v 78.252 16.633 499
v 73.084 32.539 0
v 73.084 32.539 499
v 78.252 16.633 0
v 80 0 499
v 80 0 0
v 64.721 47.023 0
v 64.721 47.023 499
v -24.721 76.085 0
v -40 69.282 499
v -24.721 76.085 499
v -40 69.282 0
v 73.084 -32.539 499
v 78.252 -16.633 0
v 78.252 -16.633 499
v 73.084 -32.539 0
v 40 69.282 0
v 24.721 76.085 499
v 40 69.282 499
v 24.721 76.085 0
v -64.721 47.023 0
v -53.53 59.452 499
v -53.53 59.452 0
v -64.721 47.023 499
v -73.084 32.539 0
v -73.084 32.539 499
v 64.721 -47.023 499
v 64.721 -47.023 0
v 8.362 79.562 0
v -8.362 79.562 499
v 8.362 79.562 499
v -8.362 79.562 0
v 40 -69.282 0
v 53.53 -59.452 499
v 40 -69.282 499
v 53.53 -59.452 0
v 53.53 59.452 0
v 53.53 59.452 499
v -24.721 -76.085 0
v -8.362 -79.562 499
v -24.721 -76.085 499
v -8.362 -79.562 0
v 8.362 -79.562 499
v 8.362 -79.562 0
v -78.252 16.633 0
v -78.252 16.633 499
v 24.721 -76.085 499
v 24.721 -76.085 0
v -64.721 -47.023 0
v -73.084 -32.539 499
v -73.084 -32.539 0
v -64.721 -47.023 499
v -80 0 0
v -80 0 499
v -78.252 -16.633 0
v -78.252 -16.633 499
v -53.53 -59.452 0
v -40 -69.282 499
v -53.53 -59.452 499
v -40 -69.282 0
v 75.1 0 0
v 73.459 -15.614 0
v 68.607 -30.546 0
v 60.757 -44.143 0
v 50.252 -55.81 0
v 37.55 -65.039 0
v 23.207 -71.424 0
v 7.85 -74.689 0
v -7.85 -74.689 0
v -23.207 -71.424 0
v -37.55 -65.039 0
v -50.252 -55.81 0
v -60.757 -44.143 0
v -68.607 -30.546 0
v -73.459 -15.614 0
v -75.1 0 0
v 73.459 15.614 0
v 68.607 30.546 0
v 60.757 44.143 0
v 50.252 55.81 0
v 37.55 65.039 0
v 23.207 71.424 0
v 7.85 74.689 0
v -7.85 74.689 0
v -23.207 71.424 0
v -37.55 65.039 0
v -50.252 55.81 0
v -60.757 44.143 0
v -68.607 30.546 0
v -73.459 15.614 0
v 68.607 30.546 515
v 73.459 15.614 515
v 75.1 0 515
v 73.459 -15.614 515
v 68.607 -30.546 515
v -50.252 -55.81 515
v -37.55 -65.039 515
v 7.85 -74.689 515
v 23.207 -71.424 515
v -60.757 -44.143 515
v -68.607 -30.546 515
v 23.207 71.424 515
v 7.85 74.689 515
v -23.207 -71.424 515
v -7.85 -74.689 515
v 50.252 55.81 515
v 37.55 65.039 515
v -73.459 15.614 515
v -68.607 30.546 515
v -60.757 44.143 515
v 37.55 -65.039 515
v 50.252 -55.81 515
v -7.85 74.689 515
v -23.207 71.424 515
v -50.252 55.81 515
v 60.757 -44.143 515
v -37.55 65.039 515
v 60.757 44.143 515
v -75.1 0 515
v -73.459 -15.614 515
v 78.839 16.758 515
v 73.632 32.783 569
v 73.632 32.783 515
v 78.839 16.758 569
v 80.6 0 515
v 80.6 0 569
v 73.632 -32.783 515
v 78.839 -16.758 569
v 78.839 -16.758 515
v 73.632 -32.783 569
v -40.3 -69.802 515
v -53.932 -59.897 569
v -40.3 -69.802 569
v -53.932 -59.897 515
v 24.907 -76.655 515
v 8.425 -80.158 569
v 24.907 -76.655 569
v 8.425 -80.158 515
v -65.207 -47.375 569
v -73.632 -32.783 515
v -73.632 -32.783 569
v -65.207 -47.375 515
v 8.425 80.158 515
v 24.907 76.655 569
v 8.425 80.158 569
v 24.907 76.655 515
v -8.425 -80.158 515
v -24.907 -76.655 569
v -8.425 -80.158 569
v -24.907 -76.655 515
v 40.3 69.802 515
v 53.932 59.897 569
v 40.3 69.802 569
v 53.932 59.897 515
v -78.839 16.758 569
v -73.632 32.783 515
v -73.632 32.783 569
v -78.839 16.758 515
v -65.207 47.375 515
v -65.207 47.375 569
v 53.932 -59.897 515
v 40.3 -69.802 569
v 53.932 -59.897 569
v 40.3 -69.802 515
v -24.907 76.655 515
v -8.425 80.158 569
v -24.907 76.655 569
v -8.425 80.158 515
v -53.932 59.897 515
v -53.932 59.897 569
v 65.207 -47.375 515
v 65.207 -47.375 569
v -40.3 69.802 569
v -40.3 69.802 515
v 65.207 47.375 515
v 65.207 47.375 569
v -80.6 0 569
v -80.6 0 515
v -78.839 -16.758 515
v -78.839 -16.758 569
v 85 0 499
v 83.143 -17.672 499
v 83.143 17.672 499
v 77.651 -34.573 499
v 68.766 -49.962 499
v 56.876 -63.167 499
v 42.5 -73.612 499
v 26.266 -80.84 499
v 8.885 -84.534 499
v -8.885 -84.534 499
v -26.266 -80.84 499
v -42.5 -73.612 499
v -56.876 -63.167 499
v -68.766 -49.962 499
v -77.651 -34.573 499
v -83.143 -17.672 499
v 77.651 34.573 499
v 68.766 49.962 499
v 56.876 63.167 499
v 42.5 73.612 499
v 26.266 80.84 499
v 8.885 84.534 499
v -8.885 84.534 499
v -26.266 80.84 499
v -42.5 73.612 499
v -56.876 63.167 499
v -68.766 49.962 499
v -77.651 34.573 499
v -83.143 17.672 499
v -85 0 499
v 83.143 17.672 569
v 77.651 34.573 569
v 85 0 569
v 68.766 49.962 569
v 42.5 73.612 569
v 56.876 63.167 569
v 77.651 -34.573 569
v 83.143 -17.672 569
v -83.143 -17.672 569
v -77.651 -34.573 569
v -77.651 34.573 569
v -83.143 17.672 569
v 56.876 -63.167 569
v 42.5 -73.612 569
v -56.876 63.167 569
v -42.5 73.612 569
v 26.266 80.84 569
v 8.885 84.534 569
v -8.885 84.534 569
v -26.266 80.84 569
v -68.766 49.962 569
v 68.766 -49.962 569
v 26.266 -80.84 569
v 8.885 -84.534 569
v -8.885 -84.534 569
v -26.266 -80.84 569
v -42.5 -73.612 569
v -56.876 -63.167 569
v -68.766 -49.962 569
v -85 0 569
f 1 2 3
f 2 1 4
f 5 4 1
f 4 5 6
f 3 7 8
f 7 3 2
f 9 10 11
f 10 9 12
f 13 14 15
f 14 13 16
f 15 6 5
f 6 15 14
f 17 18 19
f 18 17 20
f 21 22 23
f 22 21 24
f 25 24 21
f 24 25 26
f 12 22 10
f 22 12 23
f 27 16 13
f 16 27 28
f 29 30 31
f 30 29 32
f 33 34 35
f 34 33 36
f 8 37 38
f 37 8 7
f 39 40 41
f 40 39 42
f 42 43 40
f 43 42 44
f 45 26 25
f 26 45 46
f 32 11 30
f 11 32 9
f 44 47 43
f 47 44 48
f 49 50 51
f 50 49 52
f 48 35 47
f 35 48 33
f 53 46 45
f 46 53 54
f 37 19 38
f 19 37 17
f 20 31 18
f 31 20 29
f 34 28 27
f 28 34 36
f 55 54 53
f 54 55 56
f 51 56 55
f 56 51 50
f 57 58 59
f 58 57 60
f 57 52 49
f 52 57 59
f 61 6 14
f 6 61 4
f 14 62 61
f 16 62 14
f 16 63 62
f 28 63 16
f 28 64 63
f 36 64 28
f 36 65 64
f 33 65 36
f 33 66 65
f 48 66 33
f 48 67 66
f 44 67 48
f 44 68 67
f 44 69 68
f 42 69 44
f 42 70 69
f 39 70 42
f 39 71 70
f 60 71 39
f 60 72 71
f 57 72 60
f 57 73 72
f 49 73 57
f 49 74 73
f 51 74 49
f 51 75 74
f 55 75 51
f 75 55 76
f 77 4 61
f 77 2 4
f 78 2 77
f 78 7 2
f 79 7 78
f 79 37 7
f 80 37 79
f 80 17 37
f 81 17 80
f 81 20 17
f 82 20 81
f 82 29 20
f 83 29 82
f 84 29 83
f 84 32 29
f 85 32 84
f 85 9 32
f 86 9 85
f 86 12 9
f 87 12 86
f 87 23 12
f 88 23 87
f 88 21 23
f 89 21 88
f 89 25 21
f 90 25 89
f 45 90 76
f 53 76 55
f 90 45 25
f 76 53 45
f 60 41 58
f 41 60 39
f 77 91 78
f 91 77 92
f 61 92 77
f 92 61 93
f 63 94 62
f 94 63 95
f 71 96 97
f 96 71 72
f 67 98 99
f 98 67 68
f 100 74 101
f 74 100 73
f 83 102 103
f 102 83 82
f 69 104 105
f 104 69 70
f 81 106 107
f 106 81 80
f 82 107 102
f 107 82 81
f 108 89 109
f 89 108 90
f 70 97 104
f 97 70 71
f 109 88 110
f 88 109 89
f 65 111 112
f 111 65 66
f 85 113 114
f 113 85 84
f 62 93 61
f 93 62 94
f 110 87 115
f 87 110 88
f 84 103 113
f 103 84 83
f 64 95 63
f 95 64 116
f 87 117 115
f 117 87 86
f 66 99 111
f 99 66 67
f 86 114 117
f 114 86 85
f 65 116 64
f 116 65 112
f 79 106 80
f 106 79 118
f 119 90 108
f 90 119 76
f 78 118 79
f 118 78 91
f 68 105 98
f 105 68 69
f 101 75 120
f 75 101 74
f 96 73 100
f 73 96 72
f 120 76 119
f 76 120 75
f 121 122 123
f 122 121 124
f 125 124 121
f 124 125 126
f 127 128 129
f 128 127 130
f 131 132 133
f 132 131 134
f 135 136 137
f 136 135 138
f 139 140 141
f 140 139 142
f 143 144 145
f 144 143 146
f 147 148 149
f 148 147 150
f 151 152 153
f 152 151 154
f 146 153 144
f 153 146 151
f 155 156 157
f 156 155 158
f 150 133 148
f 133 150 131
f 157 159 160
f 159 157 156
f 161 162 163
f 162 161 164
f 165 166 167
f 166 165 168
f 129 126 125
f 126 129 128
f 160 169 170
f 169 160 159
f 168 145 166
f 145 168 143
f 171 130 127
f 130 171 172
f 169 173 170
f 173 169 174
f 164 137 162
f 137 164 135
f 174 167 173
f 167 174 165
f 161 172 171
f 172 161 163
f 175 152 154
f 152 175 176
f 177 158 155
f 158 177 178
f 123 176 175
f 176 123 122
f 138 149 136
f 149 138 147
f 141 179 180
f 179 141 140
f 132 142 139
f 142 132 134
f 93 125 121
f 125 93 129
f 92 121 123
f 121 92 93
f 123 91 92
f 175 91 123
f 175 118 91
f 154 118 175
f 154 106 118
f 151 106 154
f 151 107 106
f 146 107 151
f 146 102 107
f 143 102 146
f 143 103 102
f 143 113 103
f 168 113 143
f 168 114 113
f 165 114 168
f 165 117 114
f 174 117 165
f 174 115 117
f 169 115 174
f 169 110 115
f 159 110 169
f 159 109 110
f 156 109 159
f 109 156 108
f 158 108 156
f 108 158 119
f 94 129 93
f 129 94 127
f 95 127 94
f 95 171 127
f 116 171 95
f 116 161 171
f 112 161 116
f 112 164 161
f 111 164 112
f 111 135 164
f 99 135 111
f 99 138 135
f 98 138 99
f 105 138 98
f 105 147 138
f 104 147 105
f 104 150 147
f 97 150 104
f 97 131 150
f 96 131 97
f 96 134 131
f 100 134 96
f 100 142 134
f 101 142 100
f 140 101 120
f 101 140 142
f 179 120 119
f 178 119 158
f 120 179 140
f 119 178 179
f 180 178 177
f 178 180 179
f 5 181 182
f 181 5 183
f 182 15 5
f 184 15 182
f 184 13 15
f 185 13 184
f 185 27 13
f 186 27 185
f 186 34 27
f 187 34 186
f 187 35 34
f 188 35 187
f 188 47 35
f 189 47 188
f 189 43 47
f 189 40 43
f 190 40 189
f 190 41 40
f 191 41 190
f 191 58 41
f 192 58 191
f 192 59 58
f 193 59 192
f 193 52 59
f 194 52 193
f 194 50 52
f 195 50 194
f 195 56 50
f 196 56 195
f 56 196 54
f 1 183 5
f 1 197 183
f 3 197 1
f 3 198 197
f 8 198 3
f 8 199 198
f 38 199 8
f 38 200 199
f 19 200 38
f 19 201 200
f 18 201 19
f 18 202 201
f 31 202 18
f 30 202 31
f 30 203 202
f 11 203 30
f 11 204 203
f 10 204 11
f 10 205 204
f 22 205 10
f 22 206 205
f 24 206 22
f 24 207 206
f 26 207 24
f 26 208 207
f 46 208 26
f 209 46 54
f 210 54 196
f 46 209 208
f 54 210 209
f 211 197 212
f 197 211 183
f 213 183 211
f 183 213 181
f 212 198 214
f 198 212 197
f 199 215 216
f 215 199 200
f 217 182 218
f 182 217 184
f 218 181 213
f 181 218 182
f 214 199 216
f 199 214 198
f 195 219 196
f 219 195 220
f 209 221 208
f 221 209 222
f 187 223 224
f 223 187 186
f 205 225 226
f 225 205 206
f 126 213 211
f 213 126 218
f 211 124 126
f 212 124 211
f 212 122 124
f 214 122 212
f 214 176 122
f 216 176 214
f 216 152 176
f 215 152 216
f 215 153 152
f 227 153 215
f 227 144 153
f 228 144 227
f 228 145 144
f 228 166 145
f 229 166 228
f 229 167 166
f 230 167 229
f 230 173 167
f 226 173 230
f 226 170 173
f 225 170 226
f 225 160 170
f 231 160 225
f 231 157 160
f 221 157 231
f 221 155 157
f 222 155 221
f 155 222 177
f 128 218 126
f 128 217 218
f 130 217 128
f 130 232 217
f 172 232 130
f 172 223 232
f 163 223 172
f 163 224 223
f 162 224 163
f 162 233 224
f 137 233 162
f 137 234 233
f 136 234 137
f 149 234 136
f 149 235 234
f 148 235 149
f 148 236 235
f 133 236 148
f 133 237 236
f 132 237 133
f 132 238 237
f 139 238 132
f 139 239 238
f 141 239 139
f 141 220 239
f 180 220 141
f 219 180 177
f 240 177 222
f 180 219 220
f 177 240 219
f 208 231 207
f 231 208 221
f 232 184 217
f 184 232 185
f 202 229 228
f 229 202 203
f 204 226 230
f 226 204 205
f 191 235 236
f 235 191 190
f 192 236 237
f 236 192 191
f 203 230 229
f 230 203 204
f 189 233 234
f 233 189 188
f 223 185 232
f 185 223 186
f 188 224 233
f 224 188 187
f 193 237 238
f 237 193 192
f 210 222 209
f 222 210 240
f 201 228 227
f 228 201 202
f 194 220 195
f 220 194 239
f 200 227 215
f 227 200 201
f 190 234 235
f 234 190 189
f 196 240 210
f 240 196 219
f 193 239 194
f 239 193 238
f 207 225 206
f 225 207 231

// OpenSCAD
// Parameters
nominal_diameter_mm = 160; //[80:320:1]
length_mm = 500; //[250:1000:1]
wall_thickness_mm = 4.9; //[2.5:10:0.1]
fitting_length_mm = 70; //[35:140:1]
fitting_od_extra_mm = 10; //[5:25:0.5]
socket_wall_extra_mm = 2.0; //[1.0:6.0:0.1]
socket_depth_mm = 55; //[25:110:1]
socket_clearance_mm = 0.6; //[0.2:1.5:0.1]
connection_overlap_mm = 1.0; //[0.5:2.0:0.1]

// Module for the HT Pipe
module ht_pipe() {
  color([0.85, 0.85, 0.8]) {
    // Outer pipe
    difference() {
      cylinder(r=nominal_diameter_mm/2, h=length_mm, center=false);
      // Inner void
      translate([0, 0, 0])
        cylinder(r=nominal_diameter_mm/2 - wall_thickness_mm, h=length_mm, center=false);
    }
  }
}

// Module for the End Fitting
module end_fitting() {
  color([0.85, 0.85, 0.8]) {
    // Outer fitting
    difference() {
      translate([0, 0, length_mm - connection_overlap_mm])
        cylinder(r=nominal_diameter_mm/2 + fitting_od_extra_mm/2, h=fitting_length_mm, center=false);
      // Socket voids
      union() {
        translate([0, 0, length_mm + fitting_length_mm - socket_depth_mm])
          cylinder(r=nominal_diameter_mm/2 + socket_clearance_mm, h=socket_depth_mm, center=false);
        translate([0, 0, length_mm - connection_overlap_mm])
          cylinder(r=nominal_diameter_mm/2 - wall_thickness_mm, h=fitting_length_mm, center=false);
      }
    }
  }
}

// Assembly of the HT Pipe Segment
module assembly() {
  ht_pipe();
  end_fitting();
}

// Call the assembly
assembly();
